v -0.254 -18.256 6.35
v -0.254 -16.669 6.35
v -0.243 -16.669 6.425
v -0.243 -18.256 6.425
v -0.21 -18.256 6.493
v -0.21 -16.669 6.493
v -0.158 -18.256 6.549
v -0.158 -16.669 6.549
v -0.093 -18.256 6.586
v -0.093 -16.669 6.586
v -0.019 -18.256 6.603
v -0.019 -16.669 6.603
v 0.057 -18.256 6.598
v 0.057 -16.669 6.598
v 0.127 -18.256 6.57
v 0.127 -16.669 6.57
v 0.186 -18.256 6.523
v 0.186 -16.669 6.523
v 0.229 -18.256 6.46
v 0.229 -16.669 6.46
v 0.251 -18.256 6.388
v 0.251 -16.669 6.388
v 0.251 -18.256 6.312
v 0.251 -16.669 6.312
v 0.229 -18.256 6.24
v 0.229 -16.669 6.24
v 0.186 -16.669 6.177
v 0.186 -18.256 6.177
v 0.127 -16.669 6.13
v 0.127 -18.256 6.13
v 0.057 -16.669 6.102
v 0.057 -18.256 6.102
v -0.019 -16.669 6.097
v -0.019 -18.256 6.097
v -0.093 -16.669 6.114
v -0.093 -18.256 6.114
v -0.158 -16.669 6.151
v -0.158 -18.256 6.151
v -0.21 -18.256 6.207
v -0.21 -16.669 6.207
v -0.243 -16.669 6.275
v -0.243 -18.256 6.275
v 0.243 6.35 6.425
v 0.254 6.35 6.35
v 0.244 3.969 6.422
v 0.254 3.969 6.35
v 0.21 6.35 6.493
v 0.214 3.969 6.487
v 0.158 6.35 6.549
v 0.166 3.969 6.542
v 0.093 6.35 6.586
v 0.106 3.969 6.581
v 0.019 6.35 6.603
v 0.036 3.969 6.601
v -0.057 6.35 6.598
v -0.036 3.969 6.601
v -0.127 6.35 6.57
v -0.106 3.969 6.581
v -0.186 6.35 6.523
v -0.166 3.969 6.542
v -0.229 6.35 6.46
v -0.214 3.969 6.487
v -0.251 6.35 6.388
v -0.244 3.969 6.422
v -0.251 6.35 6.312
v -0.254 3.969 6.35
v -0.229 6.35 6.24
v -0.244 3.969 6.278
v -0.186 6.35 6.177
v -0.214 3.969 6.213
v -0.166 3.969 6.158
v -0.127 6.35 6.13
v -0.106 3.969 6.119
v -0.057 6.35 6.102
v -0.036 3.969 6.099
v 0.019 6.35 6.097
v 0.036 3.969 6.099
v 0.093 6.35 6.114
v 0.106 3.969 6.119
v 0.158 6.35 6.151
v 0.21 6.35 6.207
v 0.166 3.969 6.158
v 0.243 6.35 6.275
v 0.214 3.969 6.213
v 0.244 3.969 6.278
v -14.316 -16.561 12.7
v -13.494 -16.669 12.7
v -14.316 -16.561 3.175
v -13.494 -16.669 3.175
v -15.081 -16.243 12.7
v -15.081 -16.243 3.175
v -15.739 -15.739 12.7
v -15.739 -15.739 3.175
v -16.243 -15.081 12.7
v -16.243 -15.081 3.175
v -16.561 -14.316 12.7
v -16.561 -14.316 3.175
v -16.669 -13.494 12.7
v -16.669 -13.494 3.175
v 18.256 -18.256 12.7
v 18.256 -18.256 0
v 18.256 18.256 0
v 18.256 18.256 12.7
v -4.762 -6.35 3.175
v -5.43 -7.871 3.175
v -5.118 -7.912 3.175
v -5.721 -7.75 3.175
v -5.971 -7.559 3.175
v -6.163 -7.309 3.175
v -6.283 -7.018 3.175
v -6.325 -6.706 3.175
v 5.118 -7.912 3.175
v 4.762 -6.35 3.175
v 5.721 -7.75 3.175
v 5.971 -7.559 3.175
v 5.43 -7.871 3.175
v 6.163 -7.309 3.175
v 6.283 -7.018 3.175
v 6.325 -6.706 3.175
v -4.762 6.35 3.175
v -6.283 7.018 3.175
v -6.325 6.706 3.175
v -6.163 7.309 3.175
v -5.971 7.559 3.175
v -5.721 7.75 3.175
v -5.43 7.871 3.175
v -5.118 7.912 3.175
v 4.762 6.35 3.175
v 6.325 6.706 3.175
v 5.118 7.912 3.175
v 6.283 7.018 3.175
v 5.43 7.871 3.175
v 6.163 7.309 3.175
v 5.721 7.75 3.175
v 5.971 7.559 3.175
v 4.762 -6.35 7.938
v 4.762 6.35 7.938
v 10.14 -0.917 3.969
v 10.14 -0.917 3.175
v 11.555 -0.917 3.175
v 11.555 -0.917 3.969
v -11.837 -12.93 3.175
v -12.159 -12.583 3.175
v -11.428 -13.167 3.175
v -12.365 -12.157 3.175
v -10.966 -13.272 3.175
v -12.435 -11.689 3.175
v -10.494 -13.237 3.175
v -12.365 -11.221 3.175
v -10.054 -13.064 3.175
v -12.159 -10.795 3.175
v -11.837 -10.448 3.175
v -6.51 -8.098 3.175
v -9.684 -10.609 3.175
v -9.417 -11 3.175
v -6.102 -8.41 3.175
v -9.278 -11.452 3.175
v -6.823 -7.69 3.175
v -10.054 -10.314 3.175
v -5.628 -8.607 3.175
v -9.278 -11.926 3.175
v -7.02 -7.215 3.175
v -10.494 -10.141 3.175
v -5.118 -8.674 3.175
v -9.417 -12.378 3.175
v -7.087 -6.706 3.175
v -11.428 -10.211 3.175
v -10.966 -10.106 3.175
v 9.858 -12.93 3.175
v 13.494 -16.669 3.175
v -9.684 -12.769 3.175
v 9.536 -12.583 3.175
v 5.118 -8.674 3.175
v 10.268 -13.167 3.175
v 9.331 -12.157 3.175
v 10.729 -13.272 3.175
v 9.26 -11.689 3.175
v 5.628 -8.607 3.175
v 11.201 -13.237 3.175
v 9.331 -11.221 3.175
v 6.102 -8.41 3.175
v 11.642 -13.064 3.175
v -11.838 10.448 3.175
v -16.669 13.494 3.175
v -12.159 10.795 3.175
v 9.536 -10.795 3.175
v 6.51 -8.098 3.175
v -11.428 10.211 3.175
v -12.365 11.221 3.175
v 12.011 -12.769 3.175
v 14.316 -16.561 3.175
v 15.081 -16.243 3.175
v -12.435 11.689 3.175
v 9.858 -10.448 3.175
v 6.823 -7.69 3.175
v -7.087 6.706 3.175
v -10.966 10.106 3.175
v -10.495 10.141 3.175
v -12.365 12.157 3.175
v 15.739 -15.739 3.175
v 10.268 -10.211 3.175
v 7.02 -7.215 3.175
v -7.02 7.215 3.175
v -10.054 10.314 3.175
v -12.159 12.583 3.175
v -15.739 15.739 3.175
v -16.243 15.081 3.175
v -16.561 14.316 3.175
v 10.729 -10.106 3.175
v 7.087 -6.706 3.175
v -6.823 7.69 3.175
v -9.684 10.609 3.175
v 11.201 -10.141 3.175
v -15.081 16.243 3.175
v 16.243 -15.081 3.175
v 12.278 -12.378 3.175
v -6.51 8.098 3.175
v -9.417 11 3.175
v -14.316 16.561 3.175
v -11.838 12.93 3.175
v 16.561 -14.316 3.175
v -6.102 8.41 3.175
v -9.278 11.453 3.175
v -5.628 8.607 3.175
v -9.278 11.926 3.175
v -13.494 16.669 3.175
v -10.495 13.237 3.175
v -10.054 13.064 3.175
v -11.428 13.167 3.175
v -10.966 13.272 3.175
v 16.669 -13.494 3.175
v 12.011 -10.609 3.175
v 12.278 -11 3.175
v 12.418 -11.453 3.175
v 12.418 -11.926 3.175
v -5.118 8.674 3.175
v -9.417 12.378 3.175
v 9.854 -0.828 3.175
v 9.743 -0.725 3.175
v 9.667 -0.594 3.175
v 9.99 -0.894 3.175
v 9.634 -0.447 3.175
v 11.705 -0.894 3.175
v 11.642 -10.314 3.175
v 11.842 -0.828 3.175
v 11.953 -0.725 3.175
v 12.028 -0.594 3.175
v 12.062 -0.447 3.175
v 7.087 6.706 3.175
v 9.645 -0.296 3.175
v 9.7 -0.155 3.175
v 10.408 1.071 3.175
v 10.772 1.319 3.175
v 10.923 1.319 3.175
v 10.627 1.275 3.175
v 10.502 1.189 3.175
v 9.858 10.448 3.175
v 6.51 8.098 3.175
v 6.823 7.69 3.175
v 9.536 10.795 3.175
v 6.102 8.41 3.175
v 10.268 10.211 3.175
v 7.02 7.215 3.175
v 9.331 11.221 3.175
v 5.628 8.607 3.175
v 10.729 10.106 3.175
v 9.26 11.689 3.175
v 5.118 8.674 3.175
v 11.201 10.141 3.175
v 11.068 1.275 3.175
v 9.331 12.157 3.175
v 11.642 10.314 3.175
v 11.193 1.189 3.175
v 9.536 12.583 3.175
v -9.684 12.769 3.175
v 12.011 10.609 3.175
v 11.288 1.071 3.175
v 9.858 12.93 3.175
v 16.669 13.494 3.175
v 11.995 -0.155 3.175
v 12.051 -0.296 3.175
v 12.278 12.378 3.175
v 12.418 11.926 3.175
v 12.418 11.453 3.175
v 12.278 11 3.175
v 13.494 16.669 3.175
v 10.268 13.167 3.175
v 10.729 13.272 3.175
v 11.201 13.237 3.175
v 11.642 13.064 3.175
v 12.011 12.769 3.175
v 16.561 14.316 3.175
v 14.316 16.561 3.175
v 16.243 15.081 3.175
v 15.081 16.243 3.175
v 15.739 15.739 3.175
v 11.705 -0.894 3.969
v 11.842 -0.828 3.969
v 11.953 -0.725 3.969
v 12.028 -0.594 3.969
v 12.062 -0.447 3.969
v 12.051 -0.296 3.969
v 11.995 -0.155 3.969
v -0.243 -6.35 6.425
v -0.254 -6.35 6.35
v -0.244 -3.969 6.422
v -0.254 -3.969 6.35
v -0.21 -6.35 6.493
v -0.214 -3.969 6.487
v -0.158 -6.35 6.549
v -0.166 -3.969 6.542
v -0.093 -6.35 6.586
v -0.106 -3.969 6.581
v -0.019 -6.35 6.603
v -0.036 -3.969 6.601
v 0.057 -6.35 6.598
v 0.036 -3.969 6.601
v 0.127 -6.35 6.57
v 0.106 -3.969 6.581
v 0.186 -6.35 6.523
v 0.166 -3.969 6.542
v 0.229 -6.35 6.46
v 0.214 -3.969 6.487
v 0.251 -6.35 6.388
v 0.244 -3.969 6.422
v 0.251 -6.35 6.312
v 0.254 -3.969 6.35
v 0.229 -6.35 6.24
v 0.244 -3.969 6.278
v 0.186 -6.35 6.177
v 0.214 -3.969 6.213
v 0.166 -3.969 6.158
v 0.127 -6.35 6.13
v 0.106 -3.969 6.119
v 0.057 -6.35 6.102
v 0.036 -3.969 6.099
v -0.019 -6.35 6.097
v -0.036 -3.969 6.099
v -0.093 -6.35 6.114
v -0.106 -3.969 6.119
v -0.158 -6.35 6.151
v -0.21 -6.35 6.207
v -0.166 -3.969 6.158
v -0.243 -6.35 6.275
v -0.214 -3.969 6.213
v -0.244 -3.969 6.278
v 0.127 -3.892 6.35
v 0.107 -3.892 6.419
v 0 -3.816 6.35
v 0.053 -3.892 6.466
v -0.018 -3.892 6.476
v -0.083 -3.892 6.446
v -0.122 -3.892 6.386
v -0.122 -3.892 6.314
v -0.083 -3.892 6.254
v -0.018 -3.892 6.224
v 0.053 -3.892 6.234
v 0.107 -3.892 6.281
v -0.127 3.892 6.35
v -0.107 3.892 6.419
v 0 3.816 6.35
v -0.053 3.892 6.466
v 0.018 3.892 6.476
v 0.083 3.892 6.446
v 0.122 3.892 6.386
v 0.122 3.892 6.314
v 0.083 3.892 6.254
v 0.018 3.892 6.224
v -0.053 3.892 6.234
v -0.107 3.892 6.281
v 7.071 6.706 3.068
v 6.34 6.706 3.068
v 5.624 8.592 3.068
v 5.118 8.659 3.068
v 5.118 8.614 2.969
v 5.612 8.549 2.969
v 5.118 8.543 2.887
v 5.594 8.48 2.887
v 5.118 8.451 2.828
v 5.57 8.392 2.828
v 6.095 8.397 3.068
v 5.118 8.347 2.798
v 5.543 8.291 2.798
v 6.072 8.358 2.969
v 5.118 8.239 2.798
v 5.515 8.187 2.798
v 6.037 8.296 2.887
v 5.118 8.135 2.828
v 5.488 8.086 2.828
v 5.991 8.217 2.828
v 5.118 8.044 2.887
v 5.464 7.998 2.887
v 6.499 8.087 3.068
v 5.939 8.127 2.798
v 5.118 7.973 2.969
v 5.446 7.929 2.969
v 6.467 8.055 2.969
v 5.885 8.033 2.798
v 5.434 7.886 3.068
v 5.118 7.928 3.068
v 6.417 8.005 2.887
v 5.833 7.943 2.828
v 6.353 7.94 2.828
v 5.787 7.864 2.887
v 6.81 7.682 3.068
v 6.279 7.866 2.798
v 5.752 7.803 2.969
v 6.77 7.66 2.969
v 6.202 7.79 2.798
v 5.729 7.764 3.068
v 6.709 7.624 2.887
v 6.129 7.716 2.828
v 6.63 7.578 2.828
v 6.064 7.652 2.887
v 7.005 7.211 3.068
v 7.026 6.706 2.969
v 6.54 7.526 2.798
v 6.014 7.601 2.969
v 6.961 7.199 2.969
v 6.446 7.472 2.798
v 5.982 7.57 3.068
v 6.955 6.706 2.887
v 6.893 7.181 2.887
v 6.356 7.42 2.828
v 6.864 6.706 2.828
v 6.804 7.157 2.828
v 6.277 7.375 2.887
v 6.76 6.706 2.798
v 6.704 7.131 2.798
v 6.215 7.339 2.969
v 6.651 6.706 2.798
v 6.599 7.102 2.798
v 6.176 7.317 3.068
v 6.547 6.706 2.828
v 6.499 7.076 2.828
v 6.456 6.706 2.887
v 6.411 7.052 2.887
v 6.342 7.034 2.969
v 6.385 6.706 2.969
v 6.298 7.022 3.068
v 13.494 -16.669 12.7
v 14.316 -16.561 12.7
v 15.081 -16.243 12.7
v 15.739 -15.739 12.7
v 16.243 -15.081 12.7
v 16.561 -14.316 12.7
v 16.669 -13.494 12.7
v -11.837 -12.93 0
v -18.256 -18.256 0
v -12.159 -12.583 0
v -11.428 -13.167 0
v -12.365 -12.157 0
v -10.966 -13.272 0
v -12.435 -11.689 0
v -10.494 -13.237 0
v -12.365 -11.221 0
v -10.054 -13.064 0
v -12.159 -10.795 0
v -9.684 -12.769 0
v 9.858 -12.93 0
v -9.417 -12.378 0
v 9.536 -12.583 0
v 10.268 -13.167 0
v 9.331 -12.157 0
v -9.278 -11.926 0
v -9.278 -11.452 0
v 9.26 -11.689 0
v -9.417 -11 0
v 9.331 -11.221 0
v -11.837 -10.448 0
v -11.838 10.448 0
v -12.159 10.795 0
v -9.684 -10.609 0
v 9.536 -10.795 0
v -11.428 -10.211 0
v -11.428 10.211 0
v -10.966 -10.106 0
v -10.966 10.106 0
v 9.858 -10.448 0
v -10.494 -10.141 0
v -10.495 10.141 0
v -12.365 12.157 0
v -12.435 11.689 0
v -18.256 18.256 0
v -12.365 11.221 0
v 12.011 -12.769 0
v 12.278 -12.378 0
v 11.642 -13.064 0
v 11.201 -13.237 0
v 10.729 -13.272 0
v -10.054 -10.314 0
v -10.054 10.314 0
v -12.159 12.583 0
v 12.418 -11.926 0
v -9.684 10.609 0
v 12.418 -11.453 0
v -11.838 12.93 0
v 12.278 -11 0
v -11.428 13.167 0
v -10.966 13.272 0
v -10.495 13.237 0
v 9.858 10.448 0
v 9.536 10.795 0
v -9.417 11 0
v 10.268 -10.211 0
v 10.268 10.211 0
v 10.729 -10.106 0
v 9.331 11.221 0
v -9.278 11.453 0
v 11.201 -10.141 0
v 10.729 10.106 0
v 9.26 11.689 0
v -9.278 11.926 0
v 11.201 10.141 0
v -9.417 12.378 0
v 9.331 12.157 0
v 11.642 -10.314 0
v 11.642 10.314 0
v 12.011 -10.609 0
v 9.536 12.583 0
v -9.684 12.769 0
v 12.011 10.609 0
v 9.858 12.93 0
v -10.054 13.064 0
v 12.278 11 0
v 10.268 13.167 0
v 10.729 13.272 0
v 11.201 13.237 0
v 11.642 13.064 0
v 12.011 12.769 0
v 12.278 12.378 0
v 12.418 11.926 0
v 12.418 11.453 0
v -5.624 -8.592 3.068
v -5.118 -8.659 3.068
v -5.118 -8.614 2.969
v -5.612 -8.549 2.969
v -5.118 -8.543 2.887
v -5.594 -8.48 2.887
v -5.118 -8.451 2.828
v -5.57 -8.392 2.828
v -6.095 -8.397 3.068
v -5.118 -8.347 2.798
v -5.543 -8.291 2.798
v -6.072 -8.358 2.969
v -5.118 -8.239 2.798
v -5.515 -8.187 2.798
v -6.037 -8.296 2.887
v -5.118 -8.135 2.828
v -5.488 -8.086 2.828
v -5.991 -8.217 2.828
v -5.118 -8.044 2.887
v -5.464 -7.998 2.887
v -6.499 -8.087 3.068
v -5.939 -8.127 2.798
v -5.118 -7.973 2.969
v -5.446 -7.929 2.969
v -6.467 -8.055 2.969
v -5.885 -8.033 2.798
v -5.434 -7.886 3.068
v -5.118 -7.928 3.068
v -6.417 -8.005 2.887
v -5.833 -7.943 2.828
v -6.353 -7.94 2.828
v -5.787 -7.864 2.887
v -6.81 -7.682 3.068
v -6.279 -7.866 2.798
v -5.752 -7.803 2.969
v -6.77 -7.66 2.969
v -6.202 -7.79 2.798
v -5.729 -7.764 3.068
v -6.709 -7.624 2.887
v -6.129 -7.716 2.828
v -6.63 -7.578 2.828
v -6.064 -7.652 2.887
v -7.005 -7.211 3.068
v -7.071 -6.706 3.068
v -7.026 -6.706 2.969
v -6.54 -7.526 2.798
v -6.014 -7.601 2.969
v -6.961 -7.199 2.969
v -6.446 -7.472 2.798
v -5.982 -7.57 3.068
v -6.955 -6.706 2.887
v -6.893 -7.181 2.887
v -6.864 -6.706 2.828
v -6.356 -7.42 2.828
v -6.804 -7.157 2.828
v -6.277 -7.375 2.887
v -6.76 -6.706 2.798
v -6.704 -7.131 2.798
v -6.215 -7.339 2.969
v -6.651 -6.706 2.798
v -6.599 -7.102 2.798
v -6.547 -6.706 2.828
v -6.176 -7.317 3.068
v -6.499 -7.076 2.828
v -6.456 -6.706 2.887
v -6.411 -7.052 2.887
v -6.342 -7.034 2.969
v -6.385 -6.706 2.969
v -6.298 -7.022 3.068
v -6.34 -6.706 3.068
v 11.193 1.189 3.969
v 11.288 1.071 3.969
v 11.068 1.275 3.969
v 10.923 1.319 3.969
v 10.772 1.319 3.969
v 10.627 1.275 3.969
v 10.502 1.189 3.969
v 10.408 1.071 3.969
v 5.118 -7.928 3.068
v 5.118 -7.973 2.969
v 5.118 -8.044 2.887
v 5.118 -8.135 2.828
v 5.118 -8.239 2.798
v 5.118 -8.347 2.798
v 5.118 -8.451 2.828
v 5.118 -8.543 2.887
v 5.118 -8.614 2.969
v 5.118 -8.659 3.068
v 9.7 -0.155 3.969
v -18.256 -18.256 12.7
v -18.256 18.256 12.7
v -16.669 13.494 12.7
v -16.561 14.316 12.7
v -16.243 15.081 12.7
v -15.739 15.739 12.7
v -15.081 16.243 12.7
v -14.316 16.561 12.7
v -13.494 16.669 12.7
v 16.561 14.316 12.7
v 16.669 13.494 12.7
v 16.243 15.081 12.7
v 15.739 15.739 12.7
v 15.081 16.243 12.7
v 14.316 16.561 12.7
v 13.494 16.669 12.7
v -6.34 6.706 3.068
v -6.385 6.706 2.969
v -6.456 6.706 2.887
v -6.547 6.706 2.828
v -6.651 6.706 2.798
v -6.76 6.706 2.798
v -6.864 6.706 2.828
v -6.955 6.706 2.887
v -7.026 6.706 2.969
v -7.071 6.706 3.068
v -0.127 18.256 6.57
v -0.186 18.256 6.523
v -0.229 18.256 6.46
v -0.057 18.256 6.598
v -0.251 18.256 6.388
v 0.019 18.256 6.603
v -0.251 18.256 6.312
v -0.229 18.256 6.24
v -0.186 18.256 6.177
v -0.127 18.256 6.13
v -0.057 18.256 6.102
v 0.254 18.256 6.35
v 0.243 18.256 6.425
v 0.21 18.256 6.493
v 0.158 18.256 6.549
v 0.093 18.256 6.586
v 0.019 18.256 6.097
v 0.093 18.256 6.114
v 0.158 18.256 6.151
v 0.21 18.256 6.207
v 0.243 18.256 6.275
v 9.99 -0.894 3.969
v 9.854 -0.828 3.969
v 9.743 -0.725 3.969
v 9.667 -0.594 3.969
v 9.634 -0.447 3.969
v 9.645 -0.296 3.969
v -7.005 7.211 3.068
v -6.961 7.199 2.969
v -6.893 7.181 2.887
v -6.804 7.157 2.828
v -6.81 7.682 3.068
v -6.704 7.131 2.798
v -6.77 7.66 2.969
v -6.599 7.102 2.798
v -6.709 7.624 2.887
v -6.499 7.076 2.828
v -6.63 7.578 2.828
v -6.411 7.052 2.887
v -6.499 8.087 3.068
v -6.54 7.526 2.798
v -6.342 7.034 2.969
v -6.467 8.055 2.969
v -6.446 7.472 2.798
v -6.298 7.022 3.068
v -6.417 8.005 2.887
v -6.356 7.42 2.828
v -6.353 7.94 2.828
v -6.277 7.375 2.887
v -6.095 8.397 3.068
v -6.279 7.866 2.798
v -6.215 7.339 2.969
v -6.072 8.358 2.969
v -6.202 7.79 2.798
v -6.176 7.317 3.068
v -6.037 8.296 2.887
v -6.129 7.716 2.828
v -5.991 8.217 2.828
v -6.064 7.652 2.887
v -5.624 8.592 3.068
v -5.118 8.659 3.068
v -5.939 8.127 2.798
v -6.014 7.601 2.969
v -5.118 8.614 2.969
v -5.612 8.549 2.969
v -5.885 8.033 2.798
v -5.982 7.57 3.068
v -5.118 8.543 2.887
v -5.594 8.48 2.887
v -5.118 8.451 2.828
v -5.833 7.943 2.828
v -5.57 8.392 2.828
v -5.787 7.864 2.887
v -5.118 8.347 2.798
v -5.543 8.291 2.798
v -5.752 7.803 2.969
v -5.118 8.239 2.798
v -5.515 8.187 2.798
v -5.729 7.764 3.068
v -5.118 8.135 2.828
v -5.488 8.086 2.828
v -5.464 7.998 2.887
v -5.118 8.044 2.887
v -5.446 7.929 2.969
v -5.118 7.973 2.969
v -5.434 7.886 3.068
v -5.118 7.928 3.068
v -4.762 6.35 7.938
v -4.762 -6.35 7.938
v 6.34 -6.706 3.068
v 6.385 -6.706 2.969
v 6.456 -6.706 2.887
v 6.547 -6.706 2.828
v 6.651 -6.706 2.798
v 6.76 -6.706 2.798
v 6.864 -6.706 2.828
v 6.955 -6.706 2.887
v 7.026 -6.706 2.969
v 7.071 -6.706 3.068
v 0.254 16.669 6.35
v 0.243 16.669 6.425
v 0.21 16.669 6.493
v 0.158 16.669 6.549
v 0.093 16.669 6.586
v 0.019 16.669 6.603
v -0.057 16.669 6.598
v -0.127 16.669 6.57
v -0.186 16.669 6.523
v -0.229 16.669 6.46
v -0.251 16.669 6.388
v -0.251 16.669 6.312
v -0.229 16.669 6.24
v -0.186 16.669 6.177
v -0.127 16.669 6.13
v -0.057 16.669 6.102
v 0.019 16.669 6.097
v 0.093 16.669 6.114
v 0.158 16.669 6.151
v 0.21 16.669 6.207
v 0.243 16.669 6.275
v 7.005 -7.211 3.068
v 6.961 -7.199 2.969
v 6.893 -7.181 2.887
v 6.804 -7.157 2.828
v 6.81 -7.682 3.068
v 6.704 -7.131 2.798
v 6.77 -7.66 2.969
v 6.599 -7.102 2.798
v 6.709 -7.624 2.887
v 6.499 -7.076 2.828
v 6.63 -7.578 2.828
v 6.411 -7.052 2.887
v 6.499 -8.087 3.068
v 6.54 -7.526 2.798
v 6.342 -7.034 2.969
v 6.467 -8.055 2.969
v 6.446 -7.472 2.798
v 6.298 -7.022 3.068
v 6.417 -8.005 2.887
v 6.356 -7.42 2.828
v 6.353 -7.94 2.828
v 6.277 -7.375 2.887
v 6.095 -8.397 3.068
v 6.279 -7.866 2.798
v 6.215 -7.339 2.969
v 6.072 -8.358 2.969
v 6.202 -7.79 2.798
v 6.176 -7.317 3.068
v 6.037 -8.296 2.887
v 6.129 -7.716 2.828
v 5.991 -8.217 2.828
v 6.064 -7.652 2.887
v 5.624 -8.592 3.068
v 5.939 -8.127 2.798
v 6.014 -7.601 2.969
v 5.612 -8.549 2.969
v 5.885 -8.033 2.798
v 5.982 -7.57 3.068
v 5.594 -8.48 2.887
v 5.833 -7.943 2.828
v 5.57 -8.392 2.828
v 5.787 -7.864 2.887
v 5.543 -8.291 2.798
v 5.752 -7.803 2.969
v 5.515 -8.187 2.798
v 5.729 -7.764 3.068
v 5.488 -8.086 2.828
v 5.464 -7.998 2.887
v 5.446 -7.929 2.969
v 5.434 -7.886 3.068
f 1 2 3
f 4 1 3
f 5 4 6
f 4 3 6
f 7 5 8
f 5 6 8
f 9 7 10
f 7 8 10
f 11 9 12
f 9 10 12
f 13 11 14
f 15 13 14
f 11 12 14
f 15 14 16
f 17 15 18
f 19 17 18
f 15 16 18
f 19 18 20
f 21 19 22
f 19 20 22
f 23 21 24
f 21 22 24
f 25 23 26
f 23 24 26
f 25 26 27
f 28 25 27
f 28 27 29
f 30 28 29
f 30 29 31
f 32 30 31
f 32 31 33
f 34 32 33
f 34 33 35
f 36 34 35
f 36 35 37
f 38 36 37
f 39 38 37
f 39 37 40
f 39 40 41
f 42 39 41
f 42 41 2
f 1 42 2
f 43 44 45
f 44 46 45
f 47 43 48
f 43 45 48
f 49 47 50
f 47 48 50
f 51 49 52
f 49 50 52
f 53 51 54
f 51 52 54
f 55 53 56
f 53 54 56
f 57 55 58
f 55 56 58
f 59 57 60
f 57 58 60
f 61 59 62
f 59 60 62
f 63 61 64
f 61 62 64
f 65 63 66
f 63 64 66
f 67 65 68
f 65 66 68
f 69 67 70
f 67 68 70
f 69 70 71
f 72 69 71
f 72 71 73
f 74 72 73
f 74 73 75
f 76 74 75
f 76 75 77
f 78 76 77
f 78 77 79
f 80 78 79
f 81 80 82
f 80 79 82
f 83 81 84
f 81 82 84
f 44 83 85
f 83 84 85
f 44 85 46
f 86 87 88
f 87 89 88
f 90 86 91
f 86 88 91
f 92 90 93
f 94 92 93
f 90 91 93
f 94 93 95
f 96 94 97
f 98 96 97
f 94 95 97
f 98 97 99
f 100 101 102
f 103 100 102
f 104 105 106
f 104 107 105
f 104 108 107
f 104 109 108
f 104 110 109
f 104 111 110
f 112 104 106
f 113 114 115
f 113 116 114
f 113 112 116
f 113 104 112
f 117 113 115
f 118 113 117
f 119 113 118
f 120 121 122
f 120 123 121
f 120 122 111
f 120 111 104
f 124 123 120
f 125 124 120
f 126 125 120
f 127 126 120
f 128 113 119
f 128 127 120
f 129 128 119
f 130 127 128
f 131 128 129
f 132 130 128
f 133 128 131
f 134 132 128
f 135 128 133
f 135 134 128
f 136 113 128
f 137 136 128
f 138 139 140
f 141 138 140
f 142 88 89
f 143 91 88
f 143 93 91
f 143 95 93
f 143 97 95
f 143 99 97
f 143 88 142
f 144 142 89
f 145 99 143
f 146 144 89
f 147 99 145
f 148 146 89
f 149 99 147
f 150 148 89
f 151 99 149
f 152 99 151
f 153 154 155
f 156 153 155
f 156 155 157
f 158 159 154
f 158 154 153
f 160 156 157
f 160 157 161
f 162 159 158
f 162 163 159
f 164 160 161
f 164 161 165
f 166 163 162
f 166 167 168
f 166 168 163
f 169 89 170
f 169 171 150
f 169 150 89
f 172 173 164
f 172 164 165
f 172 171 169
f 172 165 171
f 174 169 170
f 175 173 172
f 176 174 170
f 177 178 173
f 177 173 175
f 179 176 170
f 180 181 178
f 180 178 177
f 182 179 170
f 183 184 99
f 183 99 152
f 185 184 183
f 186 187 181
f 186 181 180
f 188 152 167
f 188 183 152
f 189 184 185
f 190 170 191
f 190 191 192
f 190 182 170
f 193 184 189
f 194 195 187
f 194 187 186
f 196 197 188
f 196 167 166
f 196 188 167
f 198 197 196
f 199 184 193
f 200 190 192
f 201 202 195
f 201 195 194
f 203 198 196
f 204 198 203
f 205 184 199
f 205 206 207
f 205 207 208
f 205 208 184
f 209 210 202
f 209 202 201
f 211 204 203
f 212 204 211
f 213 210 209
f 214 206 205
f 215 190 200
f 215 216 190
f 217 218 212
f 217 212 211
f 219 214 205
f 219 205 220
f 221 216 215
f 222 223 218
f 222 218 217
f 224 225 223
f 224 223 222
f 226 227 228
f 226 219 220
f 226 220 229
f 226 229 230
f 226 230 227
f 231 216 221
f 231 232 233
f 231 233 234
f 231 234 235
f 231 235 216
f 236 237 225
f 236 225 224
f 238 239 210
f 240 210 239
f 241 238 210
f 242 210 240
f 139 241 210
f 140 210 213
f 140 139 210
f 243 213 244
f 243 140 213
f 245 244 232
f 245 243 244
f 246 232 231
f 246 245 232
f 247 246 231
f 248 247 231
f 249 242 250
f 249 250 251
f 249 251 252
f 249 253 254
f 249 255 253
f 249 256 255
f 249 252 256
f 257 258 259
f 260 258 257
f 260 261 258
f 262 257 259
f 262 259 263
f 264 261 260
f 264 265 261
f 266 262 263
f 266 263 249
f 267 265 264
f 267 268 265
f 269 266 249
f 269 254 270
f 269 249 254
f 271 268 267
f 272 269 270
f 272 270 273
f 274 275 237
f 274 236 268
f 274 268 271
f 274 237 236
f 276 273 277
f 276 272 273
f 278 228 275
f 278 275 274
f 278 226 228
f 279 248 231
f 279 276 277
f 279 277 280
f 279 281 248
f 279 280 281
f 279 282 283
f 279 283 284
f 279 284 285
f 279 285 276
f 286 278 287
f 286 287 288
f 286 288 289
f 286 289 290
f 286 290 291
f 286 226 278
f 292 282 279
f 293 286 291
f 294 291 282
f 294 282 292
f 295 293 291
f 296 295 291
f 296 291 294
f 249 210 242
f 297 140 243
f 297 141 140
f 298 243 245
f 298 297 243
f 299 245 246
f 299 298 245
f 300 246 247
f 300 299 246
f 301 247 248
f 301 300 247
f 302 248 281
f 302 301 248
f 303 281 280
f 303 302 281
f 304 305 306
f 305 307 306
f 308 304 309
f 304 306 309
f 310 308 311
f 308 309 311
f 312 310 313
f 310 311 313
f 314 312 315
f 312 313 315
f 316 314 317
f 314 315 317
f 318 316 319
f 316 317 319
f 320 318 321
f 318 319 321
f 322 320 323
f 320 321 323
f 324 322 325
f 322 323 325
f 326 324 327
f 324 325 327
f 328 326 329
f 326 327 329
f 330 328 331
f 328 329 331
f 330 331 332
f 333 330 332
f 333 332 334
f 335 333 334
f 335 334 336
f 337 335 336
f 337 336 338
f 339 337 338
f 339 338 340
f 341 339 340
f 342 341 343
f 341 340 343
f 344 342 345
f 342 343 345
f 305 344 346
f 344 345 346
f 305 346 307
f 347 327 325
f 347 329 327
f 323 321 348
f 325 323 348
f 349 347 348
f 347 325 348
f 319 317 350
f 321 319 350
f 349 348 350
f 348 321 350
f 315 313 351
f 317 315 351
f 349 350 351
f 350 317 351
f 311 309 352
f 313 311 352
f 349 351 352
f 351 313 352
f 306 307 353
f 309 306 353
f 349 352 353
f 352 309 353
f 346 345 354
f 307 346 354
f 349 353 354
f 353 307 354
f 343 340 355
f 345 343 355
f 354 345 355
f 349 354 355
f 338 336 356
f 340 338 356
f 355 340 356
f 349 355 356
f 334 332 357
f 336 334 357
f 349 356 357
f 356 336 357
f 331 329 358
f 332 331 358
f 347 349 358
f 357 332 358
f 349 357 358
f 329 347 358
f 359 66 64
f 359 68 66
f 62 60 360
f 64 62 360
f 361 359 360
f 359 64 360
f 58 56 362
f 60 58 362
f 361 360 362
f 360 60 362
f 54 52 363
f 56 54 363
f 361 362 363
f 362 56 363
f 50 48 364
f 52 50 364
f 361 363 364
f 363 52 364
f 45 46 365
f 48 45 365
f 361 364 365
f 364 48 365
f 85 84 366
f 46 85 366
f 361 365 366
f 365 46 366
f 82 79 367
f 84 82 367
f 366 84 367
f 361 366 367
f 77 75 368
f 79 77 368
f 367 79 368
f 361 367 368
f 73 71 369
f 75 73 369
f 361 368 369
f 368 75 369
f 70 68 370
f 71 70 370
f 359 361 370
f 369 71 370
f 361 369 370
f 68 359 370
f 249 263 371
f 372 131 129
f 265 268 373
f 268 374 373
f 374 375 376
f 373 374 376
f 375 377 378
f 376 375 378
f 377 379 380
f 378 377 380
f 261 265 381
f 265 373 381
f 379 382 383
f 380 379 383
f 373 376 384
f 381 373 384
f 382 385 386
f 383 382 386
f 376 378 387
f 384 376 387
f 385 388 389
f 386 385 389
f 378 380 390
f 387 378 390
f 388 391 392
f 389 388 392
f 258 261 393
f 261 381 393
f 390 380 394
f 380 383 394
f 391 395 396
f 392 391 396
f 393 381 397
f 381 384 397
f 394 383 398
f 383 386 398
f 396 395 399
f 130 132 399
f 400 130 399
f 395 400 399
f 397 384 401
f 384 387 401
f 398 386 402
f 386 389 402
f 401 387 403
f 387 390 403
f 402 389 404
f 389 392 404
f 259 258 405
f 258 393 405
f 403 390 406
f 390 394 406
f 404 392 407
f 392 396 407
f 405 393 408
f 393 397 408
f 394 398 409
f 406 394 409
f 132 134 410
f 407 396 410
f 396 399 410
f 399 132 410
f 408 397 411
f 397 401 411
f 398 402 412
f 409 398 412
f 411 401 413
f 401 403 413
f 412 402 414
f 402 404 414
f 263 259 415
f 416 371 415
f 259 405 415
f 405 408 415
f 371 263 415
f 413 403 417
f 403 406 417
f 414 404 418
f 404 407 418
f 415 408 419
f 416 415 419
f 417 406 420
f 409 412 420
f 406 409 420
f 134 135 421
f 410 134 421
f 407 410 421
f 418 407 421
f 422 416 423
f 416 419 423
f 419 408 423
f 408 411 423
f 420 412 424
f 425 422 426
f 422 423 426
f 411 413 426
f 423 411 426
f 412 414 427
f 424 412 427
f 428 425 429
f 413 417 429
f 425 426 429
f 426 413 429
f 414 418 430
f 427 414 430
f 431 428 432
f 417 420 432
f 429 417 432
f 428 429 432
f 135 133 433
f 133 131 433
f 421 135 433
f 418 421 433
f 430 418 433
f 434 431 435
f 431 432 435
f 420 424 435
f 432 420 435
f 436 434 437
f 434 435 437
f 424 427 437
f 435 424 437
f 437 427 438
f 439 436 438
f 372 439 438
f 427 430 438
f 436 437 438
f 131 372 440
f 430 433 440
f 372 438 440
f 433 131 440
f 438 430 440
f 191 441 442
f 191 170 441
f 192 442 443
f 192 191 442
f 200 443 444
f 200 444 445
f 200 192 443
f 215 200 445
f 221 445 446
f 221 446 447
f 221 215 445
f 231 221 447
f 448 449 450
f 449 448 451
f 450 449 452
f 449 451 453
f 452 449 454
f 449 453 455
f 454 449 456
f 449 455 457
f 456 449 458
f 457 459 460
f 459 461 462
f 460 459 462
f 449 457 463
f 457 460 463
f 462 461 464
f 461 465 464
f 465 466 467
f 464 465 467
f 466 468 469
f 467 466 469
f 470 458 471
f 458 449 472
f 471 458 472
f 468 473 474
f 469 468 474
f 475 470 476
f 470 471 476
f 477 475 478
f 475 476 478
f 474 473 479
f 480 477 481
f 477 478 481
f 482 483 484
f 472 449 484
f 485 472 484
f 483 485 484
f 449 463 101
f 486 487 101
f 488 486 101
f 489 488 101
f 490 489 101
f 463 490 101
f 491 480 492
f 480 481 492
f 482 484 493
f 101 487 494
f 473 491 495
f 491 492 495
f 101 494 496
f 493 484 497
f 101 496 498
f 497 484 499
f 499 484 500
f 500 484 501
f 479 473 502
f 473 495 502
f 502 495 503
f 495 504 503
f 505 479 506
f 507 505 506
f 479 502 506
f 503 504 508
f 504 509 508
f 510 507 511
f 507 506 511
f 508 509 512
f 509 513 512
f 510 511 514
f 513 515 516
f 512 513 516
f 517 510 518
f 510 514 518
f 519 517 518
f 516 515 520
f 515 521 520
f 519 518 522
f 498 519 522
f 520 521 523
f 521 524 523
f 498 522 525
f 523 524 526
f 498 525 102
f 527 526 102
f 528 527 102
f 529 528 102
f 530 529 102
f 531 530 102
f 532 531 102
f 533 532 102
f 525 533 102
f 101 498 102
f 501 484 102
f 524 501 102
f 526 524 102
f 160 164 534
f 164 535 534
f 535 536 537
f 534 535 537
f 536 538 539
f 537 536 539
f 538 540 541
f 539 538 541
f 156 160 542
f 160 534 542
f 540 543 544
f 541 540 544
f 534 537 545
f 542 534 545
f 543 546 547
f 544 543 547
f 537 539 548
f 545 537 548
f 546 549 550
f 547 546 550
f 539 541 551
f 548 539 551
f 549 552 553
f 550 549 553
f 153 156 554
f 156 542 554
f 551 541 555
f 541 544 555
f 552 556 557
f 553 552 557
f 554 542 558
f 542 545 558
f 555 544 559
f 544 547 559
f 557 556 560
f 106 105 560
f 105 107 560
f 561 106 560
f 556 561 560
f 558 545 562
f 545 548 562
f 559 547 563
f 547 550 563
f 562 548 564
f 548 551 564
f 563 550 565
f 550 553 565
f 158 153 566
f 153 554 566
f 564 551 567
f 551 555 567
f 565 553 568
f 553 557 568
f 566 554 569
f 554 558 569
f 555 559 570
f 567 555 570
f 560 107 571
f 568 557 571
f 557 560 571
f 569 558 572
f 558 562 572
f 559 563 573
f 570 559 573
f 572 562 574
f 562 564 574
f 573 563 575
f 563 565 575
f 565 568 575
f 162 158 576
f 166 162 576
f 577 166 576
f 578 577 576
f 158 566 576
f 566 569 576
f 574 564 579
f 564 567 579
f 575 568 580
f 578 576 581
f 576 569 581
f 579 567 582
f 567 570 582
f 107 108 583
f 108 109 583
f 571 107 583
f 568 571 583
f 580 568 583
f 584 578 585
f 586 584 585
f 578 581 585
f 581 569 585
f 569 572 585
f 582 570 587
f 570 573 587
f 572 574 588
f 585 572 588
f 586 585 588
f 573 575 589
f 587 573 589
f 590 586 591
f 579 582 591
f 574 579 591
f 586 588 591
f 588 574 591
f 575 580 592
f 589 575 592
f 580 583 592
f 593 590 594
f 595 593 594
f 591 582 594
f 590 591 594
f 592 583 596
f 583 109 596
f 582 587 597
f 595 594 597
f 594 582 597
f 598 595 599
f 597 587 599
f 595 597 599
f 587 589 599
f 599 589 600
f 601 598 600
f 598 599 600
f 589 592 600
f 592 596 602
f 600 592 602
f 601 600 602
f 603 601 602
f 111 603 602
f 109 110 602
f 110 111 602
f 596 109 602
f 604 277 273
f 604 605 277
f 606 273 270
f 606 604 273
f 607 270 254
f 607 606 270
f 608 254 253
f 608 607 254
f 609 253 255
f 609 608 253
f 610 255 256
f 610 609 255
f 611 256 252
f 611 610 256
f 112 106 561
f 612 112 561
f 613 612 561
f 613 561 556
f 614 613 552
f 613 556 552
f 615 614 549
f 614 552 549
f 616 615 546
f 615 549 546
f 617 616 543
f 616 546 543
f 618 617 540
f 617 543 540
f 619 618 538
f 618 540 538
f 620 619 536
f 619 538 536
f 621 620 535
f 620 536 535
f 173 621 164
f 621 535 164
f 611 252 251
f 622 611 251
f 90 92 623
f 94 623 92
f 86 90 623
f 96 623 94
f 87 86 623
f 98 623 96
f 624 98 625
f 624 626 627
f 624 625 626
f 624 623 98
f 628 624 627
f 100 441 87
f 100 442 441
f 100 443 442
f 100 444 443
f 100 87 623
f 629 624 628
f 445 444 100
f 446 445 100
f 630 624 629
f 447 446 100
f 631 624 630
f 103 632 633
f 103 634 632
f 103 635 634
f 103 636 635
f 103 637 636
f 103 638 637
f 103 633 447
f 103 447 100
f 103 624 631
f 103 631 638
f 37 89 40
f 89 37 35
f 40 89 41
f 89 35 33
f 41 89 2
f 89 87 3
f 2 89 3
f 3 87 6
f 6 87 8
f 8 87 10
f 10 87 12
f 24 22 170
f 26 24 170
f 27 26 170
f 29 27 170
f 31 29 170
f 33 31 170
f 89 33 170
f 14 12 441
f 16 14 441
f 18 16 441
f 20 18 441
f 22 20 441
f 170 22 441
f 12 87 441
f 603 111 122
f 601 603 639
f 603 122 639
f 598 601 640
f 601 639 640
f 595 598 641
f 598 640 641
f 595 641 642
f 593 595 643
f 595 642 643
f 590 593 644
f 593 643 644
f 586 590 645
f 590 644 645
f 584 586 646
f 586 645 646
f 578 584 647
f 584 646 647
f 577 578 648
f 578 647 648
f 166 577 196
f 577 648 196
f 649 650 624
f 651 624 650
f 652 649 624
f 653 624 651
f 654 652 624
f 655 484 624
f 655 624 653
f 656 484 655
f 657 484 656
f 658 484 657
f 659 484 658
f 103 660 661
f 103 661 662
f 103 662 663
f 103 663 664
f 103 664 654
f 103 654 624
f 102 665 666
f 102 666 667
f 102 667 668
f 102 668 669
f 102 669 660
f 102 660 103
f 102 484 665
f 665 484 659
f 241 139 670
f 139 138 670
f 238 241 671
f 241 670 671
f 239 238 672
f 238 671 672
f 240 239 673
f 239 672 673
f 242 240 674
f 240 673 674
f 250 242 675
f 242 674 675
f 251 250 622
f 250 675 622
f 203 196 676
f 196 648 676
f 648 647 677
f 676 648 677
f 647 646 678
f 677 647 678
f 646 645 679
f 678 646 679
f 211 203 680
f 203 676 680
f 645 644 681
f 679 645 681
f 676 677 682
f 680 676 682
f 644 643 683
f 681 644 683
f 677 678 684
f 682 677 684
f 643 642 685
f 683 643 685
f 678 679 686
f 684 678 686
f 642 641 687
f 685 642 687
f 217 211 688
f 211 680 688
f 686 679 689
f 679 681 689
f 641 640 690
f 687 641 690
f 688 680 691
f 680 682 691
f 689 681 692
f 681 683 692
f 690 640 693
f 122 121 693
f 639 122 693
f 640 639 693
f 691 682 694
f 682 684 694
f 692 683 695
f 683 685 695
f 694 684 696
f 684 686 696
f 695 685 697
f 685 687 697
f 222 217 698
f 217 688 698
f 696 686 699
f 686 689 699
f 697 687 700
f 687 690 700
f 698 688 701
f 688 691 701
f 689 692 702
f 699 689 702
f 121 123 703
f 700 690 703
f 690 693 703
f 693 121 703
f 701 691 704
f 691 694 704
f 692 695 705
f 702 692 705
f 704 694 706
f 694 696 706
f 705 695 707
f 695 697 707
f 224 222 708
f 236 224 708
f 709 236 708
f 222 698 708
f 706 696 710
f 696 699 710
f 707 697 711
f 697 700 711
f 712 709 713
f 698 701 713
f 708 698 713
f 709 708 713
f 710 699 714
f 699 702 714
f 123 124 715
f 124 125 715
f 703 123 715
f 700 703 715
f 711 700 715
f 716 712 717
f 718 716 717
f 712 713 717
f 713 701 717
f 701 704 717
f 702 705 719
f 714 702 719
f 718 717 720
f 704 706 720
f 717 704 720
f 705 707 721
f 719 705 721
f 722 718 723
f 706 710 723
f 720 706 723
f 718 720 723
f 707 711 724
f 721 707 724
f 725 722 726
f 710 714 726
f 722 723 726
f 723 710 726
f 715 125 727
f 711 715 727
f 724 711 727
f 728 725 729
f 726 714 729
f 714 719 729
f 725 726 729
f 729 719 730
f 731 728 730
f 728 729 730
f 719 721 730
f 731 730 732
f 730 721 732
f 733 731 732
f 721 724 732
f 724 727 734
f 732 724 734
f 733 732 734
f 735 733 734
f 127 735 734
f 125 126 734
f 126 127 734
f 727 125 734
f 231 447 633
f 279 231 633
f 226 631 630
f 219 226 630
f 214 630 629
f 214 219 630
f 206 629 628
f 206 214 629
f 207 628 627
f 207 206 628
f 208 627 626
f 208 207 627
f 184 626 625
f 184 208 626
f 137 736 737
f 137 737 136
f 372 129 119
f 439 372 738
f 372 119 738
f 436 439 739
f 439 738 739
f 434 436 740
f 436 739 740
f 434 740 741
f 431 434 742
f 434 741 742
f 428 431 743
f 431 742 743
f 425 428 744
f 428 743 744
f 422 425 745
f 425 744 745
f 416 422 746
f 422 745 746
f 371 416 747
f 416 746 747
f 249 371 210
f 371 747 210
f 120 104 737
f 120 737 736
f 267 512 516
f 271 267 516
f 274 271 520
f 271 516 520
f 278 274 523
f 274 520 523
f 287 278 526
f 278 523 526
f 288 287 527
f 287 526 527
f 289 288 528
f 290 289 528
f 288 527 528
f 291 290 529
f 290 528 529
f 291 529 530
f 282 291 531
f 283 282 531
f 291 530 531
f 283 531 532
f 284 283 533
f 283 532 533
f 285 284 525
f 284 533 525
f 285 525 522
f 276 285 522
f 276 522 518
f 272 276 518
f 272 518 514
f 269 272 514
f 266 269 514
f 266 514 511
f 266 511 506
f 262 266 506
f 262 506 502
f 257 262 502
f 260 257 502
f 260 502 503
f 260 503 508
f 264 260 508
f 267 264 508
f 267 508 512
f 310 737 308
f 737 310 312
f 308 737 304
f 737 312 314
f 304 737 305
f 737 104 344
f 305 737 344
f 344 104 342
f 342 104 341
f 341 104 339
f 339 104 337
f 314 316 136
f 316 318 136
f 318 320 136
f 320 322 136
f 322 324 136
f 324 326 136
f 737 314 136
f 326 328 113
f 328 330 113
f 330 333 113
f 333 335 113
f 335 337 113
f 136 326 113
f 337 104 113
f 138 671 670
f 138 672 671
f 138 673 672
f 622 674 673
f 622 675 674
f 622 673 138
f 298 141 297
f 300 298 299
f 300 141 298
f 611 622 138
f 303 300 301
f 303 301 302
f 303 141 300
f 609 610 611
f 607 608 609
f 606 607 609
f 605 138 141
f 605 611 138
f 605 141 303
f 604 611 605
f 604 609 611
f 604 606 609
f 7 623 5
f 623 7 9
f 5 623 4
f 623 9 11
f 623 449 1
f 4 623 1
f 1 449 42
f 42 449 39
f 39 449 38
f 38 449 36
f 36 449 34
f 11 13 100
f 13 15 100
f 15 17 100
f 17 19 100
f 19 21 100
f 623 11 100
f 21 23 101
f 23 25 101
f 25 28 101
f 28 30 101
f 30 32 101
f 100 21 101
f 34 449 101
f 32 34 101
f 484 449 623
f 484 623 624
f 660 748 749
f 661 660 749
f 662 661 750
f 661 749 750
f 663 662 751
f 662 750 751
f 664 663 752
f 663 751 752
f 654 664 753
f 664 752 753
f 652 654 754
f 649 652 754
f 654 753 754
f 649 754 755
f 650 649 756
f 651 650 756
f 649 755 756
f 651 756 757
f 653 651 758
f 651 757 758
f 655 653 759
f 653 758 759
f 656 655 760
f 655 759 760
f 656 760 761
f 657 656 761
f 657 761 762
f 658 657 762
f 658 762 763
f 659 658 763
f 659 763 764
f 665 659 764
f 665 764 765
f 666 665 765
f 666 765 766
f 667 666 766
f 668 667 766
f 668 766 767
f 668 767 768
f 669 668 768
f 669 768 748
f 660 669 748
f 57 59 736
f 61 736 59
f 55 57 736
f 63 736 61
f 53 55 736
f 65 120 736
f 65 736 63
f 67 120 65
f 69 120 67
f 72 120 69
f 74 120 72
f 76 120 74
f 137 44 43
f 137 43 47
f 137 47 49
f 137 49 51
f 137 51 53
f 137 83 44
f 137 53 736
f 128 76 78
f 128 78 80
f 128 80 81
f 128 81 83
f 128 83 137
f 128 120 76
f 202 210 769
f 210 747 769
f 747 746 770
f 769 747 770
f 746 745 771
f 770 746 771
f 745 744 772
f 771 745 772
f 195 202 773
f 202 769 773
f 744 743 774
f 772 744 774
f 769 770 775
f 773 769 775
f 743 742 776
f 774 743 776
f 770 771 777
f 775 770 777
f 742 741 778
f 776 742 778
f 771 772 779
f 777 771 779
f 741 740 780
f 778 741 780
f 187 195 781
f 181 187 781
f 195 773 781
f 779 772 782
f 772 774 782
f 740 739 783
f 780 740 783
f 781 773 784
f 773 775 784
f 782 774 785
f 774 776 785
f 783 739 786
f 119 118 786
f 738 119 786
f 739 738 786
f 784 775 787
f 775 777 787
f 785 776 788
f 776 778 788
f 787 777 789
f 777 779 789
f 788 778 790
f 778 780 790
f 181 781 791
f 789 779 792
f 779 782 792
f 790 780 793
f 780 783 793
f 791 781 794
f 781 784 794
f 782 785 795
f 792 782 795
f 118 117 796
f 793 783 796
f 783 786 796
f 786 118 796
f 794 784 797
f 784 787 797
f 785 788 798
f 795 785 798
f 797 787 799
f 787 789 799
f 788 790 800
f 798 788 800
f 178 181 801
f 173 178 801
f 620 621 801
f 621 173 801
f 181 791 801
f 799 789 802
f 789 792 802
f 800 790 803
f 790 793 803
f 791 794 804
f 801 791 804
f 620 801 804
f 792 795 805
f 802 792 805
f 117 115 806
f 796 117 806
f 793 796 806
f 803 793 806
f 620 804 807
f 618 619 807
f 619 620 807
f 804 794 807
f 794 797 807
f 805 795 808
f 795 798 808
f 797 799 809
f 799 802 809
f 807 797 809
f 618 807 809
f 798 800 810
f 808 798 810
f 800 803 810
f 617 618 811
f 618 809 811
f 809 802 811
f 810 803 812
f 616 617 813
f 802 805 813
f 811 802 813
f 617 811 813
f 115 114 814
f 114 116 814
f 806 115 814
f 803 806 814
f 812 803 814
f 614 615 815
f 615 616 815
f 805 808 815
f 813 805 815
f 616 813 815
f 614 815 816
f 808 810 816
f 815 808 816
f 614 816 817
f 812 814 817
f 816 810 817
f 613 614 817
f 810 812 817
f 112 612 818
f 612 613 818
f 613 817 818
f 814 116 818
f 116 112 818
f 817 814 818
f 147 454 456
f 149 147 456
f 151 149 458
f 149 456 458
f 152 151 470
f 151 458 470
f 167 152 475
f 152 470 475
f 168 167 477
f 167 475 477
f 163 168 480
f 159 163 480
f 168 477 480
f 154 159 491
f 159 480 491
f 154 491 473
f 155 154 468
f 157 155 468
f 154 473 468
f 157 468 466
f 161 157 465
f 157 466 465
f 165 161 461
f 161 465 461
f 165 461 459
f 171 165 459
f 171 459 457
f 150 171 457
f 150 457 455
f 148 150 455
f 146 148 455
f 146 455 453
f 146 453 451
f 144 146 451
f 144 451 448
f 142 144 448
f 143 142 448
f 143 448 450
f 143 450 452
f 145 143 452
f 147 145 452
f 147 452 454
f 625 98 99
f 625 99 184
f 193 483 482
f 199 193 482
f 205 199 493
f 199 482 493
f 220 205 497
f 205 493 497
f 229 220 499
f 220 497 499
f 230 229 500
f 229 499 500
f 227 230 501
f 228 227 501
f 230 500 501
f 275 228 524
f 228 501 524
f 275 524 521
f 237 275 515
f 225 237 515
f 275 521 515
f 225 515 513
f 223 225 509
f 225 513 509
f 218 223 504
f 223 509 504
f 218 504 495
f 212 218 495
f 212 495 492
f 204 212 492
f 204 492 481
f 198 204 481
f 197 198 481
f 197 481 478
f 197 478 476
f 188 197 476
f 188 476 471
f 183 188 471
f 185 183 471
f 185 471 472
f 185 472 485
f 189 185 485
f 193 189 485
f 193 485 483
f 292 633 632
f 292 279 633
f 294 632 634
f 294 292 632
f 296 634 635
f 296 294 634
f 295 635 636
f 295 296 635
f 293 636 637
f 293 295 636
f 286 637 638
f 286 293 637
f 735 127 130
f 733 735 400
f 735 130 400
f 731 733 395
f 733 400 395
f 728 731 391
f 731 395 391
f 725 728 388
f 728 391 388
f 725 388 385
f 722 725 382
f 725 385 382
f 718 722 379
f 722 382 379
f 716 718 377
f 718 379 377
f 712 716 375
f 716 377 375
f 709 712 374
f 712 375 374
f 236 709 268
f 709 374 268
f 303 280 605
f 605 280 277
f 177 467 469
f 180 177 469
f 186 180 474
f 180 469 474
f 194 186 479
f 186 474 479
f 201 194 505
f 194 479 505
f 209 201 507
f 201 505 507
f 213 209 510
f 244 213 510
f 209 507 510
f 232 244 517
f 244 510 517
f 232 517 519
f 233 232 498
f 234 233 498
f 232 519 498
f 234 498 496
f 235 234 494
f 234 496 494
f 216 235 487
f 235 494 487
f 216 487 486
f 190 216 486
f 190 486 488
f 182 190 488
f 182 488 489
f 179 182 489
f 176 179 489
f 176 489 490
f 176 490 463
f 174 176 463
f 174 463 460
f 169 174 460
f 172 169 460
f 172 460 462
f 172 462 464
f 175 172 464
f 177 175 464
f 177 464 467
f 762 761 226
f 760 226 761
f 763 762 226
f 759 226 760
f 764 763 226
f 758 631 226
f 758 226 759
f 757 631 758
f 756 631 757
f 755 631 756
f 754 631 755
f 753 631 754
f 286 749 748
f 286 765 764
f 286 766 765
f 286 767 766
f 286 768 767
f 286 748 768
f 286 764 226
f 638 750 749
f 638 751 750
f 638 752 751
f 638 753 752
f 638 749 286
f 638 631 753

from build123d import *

# Parameters (mm, degrees)
F0_W      = 36.5125
F0_H      = 36.5125
F1_DEPTH  = 12.7
F2_W      = 33.3375
F2_H      = 33.3375
F3_DEPTH  = 9.525
F4_W      = 9.525
F4_H      = 12.7
F5_DEPTH  = 4.7625
F7_D      = 0.508
F7_DEPTH  = 14.2875
F7_TIP    = 0.1526185972
F9_D      = 0.508
F9_DEPTH  = 14.2875
F9_TIP    = 0.1526185972
F10_R     = 3.175
F15_D     = 3.175
F17_DEPTH = 0.79375
F18_R     = 0.508


with BuildPart() as f1:
    # F0 (on Top) → F1 (new body)
    with BuildSketch(Plane.XY):
        Rectangle(F0_W, F0_H)
    extrude(amount=F1_DEPTH)

    # F2 (on face) → F3 (cut)
    with BuildSketch(Plane.XY.offset(12.7)):
        Rectangle(F2_W, F2_H)
    extrude(amount=-F3_DEPTH, mode=Mode.SUBTRACT)

    # F4 (on face) → F5 (join)
    with BuildSketch(Plane.XY.offset(3.175)):
        Rectangle(F4_W, F4_H)
    extrude(amount=F5_DEPTH)

    # F7
    with Locations(Plane.XZ.offset(18.25625)):
        with Locations((0, 6.35)):
            Hole(F7_D / 2, depth=F7_DEPTH)
            with Locations((0, 0, -(F7_DEPTH + F7_TIP / 2))):  # 118° drill point
                Cone(0, F7_D / 2, F7_TIP, mode=Mode.SUBTRACT)

    # F9
    with Locations(Plane(origin=(0, 18.25625, 0), x_dir=(-1, 0, 0), z_dir=(0, 1, 0))):
        with Locations((0, 6.35)):
            Hole(F9_D / 2, depth=F9_DEPTH)
            with Locations((0, 0, -(F9_DEPTH + F9_TIP / 2))):  # 118° drill point
                Cone(0, F9_D / 2, F9_TIP, mode=Mode.SUBTRACT)

    # F10
    f10_edges = [f1.edges().sort_by_distance(p)[0] for p in [
        (-16.66875, 16.66875, 7.9375),
        (-16.66875, -16.66875, 7.9375),
        (16.66875, -16.66875, 7.9375),
        (16.66875, 16.66875, 7.9375),
    ]]
    fillet(f10_edges, radius=F10_R)

    # F13: sweep along a path in F11
    with BuildLine(Plane.XY.offset(3.175)) as f13_path:
        Line((5.1181, -8.2931), (-5.1181, -8.2931))
        ThreePointArc((-5.1181, -8.2931), (-6.2406320151, -7.8281320151), (-6.7056, -6.7056))
        Line((-6.7056, -6.7056), (-6.7056, 0))
        Line((-6.7056, 0), (-6.7056, 6.7056))
        ThreePointArc((-6.7056, 6.7056), (-6.2406320151, 7.8281320151), (-5.1181, 8.2931))
        Line((-5.1181, 8.2931), (5.1181, 8.2931))
        ThreePointArc((5.1181, 8.2931), (6.2406320151, 7.8281320151), (6.7056, 6.7056))
        Line((6.7056, 6.7056), (6.7056, -6.7056))
        ThreePointArc((6.7056, -6.7056), (6.2406320151, -7.8281320151), (5.1181, -8.2931))
    # F12 (on Front) → F13 (sweep, cut)
    with BuildSketch(Plane.XZ):
        with BuildLine():
            Line((-6.3246, 3.175), (-7.0866, 3.175))
            ThreePointArc((-7.0866, 3.175), (-6.7056, 2.794), (-6.3246, 3.175))
        make_face()
    sweep(path=f13_path.line, mode=Mode.SUBTRACT)

    # F15 (through all)
    with Locations(Plane.XY.offset(3.175)):
        with Locations((10.8477650555, -11.6891054078), (10.8477650555, 11.6891054078), (-10.8477650555, 11.6891054078), (-10.8476863706, -11.689040258)):
            Hole(F15_D / 2)

    # F16 (on face) → F17 (join)
    with BuildSketch(Plane.XY.offset(3.175)):
        Polygon((9.2602650555, -0.9165435523), (12.4352650555, -0.9165435523), (10.8477650555, 1.8330871047), align=None)
    extrude(amount=F17_DEPTH)

    # F18
    f18_edges = [f1.edges().sort_by_distance(p)[0] for p in [
        (10.847765, 1.833087, 3.571875),
        (12.435265, -0.916544, 3.571875),
        (9.260265, -0.916544, 3.571875),
    ]]
    fillet(f18_edges, radius=F18_R)


solid = f1.part
